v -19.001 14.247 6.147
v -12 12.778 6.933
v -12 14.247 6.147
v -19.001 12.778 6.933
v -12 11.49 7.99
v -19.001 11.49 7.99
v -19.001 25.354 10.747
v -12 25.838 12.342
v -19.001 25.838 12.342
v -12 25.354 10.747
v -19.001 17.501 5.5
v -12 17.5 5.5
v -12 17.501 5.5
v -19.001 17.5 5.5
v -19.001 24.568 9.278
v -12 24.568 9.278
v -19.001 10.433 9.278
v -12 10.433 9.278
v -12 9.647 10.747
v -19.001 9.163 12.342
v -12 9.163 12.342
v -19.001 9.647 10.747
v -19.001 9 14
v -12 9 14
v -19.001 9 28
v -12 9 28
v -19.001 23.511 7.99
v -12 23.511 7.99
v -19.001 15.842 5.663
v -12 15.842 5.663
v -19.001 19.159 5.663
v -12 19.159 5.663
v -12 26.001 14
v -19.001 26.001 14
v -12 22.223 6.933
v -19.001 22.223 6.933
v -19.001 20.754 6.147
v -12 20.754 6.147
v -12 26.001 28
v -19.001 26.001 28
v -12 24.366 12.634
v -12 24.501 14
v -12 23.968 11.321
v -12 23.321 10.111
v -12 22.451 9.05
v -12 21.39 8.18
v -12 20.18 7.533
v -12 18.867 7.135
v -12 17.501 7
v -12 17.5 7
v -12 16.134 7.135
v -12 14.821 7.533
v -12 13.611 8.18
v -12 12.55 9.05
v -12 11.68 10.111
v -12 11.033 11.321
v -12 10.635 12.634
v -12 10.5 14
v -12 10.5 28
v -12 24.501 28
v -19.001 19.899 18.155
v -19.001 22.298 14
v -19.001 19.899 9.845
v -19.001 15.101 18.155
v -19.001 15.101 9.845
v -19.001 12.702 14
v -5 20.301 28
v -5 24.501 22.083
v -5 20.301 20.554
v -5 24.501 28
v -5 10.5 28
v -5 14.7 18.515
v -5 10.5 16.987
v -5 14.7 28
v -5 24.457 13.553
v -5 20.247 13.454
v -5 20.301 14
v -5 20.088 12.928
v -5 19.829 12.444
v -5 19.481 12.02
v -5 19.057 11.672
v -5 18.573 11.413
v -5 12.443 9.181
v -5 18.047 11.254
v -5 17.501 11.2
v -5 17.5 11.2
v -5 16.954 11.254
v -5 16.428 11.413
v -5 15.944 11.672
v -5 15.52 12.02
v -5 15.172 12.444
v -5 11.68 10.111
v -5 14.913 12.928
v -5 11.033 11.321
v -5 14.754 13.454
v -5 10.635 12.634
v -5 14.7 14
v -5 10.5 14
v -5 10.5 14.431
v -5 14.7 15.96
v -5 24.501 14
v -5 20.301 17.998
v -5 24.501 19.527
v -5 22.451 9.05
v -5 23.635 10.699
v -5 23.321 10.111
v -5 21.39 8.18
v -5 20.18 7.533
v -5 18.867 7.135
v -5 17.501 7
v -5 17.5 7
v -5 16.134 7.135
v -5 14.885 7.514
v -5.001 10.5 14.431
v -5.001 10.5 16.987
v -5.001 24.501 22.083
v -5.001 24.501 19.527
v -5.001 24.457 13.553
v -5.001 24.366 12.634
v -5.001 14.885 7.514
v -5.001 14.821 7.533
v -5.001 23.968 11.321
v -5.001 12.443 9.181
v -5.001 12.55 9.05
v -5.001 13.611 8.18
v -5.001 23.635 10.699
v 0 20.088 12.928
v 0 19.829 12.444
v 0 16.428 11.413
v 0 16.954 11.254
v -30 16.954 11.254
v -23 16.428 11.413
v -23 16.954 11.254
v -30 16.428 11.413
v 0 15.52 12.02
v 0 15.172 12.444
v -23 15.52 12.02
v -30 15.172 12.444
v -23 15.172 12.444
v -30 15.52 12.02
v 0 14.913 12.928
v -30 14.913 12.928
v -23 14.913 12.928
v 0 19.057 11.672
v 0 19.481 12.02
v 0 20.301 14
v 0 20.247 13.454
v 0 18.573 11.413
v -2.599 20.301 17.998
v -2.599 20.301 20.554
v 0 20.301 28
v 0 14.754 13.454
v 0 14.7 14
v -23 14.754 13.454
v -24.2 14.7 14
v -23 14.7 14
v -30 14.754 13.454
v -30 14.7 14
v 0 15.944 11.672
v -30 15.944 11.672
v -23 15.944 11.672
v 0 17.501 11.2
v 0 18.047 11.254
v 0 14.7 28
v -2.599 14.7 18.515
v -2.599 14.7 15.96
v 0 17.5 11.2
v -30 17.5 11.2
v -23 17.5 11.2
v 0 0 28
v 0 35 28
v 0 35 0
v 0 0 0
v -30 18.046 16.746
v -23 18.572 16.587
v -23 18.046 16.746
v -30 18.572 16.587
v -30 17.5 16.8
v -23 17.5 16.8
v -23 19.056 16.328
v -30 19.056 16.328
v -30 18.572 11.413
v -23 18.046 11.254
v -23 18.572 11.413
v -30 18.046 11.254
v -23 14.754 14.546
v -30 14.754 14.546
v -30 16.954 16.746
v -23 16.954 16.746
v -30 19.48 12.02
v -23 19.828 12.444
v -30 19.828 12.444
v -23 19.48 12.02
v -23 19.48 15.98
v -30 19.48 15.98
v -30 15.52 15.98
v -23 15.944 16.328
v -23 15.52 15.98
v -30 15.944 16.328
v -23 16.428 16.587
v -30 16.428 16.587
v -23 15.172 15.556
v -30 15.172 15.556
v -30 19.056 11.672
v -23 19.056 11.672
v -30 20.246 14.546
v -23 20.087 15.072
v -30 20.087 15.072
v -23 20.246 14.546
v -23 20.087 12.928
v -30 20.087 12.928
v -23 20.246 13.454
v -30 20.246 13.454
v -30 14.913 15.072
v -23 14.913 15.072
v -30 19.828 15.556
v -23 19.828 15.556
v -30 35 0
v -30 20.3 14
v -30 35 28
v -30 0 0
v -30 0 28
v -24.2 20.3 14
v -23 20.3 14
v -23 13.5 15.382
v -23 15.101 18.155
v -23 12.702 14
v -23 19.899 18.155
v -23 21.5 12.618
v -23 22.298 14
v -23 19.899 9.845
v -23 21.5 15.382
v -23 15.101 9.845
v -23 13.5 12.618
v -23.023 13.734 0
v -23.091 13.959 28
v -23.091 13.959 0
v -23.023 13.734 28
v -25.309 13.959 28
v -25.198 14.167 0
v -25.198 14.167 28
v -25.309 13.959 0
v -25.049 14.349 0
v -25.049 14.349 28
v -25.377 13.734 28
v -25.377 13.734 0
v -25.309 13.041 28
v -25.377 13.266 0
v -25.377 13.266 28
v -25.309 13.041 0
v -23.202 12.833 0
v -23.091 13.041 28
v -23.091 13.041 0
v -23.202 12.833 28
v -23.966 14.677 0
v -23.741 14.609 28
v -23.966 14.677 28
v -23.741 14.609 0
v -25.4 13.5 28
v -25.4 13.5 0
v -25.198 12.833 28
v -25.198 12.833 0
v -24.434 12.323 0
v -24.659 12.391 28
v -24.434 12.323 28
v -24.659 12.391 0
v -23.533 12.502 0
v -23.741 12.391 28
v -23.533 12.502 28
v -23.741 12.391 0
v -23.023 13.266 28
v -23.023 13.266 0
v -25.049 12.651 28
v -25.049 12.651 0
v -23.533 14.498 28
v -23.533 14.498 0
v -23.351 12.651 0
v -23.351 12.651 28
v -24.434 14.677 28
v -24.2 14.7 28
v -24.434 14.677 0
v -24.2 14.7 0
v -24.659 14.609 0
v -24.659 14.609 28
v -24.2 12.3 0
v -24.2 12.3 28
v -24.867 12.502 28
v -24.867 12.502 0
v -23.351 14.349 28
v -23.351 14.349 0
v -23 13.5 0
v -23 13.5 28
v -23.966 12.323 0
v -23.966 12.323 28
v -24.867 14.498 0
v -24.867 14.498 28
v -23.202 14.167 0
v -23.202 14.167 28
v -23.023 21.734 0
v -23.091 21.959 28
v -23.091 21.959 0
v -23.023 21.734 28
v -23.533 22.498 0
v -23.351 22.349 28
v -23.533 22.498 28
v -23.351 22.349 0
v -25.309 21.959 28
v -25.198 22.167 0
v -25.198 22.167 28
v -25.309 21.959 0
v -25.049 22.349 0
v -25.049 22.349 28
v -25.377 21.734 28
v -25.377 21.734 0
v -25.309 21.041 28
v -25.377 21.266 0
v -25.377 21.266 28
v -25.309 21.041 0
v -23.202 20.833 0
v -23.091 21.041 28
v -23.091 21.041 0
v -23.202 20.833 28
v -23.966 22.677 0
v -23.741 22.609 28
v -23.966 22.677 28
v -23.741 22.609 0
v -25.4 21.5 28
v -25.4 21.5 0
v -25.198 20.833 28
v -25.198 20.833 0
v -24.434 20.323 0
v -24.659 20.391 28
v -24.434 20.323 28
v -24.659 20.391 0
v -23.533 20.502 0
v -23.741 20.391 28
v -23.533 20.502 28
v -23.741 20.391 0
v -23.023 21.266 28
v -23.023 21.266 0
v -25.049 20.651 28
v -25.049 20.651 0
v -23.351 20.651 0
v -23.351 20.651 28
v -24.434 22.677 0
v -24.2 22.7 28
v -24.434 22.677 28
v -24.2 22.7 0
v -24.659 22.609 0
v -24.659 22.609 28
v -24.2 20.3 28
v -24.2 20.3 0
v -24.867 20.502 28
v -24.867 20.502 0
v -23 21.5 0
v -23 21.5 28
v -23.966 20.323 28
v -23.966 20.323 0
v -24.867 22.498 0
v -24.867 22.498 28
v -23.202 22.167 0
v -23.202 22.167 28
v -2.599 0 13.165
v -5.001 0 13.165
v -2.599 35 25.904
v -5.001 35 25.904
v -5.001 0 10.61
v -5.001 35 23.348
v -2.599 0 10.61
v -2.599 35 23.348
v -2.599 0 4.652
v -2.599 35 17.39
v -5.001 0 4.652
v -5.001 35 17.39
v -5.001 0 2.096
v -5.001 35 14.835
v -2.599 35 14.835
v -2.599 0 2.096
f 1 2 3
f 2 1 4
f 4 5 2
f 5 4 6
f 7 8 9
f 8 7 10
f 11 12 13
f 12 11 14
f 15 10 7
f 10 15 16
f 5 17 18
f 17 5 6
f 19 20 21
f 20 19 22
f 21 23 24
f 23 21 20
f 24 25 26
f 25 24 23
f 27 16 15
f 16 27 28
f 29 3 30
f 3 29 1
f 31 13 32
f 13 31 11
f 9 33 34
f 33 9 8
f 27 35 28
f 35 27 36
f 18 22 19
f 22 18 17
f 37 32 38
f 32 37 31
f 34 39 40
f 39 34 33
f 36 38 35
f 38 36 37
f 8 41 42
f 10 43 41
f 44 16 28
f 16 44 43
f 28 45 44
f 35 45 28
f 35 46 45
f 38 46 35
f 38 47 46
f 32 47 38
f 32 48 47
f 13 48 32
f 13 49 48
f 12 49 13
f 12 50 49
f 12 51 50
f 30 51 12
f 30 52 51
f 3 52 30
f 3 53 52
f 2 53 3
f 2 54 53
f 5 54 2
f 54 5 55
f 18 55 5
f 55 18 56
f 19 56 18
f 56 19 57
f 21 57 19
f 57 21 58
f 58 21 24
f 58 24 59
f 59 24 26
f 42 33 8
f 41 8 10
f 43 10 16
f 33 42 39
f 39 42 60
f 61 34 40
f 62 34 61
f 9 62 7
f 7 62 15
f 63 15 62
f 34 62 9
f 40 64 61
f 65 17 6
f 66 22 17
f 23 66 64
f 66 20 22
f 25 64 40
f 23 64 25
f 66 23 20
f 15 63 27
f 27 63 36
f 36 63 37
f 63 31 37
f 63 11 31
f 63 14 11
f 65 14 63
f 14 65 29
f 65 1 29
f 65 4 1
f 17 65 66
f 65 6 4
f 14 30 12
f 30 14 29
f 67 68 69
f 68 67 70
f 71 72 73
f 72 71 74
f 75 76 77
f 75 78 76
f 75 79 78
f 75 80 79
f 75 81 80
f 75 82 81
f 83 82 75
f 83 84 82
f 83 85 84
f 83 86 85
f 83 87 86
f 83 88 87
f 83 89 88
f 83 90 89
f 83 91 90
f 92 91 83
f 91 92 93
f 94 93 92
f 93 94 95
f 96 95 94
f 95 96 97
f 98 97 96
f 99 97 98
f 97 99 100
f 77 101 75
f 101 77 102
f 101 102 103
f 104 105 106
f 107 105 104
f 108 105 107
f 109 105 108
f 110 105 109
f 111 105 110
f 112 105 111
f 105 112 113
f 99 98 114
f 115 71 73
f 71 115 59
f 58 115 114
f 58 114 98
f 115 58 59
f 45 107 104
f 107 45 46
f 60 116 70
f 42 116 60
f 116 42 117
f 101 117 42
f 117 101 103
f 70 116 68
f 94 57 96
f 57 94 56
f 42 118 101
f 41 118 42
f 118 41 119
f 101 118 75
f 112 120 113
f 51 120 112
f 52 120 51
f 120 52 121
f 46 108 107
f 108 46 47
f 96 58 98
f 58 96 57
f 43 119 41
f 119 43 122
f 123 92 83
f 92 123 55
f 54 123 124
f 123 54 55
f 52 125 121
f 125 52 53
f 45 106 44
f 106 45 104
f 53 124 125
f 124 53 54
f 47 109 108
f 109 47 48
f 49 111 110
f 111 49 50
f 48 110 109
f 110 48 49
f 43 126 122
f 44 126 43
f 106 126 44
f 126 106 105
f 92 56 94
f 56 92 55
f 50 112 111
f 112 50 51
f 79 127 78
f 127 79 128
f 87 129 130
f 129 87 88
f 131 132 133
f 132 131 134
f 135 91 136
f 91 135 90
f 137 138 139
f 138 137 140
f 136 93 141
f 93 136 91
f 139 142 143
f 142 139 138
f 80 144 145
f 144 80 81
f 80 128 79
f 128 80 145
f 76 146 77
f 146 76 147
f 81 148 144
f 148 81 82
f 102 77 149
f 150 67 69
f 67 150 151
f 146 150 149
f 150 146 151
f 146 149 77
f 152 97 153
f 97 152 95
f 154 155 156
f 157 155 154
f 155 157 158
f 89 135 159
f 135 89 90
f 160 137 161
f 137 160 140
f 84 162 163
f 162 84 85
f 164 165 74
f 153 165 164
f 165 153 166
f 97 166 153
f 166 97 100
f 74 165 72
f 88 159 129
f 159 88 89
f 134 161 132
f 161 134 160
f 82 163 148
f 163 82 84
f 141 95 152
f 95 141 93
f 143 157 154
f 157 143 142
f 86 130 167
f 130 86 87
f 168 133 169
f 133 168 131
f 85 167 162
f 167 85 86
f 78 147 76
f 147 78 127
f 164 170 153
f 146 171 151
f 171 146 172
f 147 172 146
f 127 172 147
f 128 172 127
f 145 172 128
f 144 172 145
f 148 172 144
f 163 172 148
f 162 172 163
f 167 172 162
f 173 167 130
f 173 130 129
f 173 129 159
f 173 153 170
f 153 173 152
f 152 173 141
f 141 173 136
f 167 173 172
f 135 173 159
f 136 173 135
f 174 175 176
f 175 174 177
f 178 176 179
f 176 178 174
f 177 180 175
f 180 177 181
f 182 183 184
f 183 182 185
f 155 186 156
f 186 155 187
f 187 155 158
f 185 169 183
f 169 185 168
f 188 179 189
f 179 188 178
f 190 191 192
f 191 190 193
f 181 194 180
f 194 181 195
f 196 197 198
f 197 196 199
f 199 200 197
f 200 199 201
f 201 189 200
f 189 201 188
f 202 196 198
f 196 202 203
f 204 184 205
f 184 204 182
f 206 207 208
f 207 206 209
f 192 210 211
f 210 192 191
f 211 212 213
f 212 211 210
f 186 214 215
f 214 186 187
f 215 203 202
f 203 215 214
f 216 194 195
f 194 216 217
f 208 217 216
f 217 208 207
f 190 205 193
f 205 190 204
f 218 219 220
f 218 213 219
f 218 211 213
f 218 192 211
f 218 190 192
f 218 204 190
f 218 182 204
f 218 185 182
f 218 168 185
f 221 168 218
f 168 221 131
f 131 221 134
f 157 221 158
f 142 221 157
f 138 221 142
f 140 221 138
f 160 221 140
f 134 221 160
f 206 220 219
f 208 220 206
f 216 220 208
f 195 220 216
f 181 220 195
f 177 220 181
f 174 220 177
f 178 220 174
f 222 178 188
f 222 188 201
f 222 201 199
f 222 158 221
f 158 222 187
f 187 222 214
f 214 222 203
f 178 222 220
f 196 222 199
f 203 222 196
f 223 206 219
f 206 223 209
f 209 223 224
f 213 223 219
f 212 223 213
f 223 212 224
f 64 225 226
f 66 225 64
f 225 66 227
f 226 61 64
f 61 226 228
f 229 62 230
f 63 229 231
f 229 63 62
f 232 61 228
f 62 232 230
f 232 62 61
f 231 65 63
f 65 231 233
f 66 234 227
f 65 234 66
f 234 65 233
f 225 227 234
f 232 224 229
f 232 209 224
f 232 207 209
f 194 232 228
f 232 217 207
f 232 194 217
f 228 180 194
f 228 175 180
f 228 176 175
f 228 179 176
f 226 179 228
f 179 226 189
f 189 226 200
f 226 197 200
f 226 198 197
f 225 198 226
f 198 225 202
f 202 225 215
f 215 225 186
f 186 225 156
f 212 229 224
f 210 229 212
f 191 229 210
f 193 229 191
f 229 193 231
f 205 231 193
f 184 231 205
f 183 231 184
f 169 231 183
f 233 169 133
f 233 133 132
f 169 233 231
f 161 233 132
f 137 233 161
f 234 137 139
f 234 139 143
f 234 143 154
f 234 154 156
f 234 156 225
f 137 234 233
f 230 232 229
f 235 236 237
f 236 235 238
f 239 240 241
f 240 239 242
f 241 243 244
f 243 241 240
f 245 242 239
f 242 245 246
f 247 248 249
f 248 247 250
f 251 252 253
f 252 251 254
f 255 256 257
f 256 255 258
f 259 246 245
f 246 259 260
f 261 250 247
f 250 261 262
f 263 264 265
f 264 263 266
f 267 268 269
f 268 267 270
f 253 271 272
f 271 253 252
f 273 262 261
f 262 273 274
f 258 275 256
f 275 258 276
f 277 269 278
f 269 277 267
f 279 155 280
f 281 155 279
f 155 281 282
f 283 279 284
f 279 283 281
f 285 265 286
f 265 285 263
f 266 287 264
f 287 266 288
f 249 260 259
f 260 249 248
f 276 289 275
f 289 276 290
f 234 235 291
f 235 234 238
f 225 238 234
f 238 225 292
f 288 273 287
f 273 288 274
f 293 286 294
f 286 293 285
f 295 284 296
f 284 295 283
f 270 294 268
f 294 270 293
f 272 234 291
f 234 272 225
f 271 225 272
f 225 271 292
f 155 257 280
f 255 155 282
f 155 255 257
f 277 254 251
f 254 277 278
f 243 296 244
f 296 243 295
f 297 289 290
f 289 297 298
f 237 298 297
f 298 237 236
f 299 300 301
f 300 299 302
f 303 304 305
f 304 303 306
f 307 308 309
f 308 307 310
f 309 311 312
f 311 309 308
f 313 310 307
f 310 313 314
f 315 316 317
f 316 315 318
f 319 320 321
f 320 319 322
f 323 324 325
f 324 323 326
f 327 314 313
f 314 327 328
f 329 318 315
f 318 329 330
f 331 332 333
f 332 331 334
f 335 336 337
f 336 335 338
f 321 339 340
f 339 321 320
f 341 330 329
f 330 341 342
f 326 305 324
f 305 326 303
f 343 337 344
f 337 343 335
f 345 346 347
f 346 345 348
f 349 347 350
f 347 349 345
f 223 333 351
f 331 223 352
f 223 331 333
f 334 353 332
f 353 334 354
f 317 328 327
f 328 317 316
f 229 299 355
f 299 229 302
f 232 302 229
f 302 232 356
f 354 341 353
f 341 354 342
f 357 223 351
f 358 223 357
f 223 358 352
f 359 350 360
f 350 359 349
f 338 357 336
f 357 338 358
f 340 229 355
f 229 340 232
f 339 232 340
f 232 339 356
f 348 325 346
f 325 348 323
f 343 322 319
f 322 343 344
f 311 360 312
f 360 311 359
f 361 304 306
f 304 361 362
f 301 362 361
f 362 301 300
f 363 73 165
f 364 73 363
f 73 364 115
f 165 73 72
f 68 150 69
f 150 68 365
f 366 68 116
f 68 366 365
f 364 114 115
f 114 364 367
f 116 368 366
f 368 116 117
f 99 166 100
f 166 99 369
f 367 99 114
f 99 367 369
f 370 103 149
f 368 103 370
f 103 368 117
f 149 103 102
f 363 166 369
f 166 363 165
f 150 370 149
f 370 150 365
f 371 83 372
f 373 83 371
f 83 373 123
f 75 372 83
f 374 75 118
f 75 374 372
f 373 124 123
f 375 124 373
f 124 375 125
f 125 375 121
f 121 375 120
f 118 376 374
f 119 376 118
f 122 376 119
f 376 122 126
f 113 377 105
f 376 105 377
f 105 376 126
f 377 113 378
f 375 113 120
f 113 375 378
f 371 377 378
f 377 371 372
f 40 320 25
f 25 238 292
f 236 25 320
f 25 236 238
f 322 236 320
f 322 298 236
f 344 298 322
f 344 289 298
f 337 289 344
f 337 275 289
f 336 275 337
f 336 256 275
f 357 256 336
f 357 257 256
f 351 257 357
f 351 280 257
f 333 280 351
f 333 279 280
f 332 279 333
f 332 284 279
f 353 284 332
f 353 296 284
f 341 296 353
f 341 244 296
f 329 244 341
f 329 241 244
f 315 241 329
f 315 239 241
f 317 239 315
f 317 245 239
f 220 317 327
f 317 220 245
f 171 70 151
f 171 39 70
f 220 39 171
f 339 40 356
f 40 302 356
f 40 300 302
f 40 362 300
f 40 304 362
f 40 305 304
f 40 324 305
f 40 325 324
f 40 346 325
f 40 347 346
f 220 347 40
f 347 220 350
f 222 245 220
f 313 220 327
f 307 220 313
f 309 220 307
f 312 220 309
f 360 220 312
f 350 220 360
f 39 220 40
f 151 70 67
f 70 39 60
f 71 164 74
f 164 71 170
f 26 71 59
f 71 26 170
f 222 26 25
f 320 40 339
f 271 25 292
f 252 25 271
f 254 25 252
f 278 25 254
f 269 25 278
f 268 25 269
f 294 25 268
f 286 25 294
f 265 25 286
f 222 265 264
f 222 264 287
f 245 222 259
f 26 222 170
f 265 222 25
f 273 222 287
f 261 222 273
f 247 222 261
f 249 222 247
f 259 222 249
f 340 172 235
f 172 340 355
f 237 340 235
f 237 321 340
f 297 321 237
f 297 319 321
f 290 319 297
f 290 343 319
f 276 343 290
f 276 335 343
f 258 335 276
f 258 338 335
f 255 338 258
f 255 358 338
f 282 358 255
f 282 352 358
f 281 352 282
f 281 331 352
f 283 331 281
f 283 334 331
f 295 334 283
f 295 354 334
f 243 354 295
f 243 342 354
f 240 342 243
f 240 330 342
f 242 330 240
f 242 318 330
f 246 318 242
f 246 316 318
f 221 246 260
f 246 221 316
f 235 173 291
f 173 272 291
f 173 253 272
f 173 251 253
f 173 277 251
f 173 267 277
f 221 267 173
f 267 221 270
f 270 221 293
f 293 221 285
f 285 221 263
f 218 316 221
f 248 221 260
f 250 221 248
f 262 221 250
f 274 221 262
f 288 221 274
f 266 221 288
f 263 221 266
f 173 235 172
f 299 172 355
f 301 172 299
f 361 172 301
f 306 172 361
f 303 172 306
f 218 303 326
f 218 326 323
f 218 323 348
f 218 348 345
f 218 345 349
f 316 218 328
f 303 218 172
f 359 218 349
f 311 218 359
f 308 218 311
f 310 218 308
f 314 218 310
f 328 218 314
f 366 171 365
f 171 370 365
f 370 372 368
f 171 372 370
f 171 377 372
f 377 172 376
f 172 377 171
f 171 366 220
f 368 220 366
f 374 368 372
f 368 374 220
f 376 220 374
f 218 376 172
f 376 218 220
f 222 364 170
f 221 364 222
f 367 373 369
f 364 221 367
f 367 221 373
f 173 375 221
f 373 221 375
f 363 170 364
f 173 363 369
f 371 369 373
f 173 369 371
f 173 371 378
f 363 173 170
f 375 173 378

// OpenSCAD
// Created by Jakub Husak, Poland, 27.07.2013
// Licence: Attribution - Non-Commercial - Share Alike
// Script to create a customizable gear puller. It could be important that
// the gear fits tightly and the lower part is as thick as the gap between
// motor and gear.

// Thick of bottom collar
hbottom=5; // [3:10

// Height of the lower part of the gear
hgear=7;

// Radius of the lower part of the gear
rgear=7; // [4:20]

// Height of the upper part of the gear
hgeart=7; // [0:20]

// Radius of the uppper part of the gear
rgeart=8.5; // [4:20]

// Thick of the top (must be more thick as the pins and nut together plus 2 mm)
htop=11; // [5:20]

// Radius of the motor shaft
rshaft=2.8; 

// Radius of the pins
rrivet=1.2;

// Thick of the nut
hnut=4; // [3:6]

// Nut size 
snut=8; // [6:13]

/* */
oheight=hbottom+hgear+hgeart+htop;
$fn=32;


rotate([0,-90,0])
difference()
{
cube([4*rgear,5*rgear,oheight]);
translate([2*rgear,2.5*rgear,0])
dig();
}

module dig()
{
niche();
shaft();
translate([0,0,hbottom+hgear+hgeart+hnut])
rivetholes(1,32,1);
rotate([0,0,70])
translate([0,0,hbottom])
rivetholes(-1,4,1.415);
}

module niche()
{
minkowski(){
hole();
cube([2*rgear,0.001,0.001]);
}

}
module hole()
{
cylinder(h=hbottom, r=rshaft);
translate([0,0,hbottom])
cylinder(h=hgear, r=rgear);
translate([0,0,hbottom+hgear])
cylinder(h=hgeart, r=rgeart);
}

module shaft()
{
cylinder(h=oheight, r=rshaft);
translate([0,0,hbottom+hgear+hgeart])
rotate([0,0,30])
cylinder(h=hnut, r=snut/2/0.87+0.2, $fn=6);

}

module rivetholes(off,c,d)
{
$fn=c;
for (i=[-1,1])
rotate([90,0,90])
translate([i*(rshaft+rrivet),off*rrivet,0])
rotate([0,0,45])
cylinder(r=rrivet*d,h=100,center=true);


}
